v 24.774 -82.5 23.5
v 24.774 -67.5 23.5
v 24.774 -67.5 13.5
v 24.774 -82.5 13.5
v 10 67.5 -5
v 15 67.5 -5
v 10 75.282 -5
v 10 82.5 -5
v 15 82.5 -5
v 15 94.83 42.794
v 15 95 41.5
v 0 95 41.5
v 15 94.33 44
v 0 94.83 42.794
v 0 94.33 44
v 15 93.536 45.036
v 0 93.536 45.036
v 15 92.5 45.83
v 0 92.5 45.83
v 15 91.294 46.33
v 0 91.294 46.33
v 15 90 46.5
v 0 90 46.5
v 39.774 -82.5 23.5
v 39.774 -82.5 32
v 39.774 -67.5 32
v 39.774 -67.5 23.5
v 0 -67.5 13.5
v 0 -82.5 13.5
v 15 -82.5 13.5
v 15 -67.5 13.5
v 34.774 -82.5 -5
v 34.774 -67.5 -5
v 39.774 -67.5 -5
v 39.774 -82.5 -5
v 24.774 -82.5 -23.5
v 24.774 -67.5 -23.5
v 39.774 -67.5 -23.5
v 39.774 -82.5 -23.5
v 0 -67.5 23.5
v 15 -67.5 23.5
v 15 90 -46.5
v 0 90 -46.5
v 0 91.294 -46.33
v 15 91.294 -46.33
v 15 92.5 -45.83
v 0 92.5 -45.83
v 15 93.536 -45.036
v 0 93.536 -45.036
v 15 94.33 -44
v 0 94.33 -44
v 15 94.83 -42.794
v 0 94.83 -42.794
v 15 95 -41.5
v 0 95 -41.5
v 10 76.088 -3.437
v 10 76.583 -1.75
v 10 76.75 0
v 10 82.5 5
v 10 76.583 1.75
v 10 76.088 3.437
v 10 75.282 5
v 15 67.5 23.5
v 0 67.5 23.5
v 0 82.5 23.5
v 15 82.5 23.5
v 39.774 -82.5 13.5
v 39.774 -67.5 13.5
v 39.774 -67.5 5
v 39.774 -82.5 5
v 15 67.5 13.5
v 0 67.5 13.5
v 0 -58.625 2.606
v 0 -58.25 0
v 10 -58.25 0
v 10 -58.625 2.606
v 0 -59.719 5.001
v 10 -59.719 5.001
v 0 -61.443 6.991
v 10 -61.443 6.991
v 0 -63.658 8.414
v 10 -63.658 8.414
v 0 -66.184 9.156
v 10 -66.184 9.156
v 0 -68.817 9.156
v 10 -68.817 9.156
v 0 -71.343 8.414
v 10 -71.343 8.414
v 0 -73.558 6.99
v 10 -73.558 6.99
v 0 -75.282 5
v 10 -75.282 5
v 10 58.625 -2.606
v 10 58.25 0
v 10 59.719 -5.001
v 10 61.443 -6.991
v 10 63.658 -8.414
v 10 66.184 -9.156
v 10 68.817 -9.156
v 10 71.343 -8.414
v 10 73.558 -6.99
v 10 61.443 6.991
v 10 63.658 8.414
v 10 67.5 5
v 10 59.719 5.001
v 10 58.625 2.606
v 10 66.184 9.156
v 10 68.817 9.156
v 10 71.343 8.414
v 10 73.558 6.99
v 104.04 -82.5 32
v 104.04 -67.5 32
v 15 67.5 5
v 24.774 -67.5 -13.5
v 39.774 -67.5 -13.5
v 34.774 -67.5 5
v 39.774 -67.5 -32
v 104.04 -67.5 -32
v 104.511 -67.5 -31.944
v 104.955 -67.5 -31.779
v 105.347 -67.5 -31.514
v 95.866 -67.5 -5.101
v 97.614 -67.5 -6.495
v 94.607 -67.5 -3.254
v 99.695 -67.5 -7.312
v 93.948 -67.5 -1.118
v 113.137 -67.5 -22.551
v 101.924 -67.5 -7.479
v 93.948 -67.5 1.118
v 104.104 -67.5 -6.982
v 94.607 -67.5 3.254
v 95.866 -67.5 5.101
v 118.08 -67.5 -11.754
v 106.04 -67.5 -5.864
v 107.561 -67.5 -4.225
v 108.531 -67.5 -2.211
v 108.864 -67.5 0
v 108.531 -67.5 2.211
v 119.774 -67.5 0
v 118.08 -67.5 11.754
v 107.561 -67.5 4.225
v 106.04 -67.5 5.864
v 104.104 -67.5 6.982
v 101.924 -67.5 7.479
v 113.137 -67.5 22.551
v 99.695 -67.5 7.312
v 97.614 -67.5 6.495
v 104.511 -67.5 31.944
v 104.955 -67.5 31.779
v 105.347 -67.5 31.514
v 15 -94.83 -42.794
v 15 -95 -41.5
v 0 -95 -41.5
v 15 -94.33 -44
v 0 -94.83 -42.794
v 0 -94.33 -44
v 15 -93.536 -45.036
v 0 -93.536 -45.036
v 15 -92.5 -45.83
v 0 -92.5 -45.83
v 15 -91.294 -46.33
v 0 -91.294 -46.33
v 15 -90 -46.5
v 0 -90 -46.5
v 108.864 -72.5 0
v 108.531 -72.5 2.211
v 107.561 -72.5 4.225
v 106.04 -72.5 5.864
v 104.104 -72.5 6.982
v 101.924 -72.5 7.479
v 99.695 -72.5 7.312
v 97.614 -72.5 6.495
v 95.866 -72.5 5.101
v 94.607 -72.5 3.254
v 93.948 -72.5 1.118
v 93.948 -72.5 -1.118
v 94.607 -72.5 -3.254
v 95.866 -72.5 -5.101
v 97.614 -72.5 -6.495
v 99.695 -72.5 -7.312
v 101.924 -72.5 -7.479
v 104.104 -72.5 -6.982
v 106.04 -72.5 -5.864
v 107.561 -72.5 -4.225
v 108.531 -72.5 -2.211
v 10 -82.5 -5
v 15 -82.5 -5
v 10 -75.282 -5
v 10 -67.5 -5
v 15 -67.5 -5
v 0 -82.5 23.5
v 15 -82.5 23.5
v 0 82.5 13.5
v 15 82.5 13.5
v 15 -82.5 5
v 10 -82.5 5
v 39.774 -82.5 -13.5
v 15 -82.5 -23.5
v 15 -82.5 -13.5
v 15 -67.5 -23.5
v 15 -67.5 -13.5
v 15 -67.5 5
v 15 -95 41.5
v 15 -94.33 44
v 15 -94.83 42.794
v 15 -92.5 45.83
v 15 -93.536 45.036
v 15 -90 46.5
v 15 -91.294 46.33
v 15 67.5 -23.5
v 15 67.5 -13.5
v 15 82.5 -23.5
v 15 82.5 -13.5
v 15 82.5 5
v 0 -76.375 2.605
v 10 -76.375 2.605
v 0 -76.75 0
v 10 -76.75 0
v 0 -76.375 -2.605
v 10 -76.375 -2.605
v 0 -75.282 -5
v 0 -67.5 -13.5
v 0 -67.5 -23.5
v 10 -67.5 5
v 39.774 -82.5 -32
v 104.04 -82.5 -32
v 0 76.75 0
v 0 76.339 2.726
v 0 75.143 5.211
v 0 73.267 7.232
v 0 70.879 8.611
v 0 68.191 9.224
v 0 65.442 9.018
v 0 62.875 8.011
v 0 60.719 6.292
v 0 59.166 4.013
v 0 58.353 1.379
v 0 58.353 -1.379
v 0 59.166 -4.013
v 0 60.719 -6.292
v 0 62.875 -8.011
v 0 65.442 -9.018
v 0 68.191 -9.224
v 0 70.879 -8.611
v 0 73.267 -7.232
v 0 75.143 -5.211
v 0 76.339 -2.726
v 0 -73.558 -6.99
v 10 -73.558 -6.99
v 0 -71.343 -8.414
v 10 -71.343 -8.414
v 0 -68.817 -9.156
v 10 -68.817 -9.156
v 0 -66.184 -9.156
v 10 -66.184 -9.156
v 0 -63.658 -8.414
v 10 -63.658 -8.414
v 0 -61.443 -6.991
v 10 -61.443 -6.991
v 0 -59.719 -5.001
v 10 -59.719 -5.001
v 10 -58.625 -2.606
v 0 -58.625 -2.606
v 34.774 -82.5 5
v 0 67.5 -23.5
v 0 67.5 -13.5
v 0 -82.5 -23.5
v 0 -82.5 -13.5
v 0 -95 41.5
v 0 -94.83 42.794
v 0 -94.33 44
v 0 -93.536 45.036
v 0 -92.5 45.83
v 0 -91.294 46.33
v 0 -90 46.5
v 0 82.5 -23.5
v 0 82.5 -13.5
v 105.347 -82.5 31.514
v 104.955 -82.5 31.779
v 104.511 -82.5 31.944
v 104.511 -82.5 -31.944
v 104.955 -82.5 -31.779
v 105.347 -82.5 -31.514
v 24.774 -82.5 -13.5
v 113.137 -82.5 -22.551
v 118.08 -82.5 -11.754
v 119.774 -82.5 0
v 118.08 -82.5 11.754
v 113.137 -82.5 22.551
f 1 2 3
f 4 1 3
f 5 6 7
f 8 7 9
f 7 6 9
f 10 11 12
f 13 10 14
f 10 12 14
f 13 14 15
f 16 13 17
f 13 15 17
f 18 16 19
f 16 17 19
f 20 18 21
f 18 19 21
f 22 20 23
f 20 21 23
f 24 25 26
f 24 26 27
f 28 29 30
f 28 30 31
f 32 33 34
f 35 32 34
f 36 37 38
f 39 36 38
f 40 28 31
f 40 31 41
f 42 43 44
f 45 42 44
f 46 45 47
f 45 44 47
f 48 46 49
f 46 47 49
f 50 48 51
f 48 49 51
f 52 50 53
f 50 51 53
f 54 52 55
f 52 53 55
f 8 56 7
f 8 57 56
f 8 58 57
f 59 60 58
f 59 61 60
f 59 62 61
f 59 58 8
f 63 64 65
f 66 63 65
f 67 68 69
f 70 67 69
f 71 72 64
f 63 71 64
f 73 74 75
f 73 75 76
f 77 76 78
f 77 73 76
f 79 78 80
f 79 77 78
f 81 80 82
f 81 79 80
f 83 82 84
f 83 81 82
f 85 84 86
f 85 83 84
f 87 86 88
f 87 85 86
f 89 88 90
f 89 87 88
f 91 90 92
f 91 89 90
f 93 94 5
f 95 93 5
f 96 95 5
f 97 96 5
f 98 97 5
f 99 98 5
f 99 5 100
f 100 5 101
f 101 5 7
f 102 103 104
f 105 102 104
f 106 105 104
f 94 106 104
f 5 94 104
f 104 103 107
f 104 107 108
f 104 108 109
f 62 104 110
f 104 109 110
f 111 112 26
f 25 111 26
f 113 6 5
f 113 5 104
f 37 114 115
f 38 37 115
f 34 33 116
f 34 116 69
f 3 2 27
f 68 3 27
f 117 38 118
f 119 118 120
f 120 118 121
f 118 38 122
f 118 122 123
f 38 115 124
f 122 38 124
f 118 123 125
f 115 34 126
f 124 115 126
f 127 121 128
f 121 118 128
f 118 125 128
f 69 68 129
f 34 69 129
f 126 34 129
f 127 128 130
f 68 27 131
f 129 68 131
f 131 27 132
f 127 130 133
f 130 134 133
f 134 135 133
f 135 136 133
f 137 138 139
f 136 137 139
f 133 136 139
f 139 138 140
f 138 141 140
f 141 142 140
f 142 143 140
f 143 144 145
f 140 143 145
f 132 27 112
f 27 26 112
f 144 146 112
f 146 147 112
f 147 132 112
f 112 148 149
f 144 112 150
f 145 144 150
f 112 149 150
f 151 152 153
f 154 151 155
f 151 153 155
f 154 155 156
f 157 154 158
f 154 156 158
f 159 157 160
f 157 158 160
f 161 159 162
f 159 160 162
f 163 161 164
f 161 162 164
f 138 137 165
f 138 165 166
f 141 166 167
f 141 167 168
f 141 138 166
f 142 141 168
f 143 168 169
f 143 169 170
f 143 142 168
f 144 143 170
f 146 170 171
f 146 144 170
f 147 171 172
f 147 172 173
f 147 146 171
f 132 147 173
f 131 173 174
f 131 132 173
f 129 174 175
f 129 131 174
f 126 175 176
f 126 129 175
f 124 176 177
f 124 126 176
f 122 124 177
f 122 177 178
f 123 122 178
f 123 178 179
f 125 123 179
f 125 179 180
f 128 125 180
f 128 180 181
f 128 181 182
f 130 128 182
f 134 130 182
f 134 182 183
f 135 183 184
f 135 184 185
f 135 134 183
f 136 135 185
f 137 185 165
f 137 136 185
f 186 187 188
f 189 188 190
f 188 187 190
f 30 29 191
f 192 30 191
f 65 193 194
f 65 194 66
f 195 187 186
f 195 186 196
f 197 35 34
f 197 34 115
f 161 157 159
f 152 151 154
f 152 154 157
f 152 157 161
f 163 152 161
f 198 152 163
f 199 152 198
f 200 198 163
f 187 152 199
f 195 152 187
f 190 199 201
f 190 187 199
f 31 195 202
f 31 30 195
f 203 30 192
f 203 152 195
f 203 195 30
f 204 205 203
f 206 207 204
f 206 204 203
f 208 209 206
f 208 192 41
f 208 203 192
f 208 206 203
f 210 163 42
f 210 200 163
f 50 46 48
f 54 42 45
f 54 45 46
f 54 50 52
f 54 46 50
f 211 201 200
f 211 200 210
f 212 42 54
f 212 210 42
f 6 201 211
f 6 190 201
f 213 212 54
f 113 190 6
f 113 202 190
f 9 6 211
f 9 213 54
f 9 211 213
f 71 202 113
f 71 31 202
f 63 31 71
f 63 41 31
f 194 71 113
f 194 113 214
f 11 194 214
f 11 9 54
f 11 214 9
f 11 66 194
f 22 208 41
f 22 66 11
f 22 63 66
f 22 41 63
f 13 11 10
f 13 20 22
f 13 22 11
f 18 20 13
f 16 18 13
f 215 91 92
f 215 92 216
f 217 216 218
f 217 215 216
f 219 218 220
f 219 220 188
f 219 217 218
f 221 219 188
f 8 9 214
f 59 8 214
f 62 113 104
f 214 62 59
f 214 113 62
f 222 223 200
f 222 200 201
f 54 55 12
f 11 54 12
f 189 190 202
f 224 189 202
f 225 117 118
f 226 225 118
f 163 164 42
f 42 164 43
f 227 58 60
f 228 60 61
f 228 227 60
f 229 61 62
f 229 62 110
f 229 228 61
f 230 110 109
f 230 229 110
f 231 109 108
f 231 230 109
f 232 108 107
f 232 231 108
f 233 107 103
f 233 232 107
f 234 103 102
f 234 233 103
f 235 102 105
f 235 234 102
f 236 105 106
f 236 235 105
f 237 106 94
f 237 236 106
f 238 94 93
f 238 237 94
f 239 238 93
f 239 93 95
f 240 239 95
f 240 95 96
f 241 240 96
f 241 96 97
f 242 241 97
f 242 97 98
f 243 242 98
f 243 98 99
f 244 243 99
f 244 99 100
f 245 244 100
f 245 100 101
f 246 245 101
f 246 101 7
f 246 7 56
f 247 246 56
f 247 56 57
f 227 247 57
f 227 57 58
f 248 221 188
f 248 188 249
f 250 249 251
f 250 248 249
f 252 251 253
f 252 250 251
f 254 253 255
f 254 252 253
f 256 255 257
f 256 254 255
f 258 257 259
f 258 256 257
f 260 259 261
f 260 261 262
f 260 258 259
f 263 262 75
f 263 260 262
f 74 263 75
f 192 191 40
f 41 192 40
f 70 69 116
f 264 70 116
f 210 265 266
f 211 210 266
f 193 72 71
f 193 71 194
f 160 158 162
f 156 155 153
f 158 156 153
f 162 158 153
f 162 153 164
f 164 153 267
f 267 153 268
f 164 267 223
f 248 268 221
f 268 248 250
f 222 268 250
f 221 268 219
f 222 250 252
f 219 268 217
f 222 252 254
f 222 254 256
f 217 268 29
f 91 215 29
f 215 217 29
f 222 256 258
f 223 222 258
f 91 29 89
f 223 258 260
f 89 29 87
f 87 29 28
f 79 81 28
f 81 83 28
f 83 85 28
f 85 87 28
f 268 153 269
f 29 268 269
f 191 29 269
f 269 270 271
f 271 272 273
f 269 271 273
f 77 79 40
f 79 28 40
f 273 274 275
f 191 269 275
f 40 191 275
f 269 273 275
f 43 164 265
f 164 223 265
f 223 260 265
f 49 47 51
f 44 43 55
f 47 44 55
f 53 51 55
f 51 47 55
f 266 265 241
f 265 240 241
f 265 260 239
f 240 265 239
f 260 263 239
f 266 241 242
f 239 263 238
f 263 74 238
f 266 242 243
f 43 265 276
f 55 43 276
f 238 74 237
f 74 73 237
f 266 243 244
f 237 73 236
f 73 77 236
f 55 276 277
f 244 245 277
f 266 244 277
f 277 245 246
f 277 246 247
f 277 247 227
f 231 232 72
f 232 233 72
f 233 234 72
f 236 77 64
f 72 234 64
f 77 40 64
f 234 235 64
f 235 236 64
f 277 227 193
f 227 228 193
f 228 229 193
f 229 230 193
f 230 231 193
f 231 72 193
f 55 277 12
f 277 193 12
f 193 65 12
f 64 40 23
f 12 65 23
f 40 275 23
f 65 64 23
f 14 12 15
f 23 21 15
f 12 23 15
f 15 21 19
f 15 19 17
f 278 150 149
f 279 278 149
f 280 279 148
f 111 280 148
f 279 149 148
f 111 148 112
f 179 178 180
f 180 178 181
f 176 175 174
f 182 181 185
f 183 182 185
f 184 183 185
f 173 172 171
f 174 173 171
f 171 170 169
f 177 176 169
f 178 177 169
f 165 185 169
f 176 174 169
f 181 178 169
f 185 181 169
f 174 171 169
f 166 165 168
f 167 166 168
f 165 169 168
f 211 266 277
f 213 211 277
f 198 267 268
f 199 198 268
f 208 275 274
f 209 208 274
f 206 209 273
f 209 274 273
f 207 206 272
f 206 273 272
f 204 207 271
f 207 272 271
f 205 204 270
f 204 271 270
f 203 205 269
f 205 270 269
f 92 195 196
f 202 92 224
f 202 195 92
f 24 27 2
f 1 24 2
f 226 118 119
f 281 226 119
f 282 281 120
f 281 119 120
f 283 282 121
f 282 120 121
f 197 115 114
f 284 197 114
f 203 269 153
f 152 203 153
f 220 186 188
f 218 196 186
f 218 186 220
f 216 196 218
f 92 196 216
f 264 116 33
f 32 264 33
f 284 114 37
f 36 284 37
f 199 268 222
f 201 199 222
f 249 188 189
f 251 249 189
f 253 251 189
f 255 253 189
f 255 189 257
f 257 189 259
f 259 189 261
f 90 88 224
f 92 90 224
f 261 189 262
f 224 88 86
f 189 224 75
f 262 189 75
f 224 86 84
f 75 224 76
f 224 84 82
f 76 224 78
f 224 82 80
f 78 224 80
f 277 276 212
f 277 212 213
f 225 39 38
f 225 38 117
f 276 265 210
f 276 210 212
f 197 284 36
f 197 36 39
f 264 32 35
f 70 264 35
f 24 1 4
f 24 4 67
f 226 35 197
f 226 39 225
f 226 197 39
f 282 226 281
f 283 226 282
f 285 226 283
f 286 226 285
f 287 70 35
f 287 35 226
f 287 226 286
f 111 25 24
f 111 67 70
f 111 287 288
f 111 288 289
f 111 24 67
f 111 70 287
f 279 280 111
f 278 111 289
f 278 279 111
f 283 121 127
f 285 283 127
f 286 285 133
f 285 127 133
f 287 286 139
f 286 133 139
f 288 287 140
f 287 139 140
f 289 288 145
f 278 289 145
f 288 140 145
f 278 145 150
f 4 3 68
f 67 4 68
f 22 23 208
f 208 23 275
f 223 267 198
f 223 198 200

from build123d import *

# Parameters (mm, degrees)
F0_W     = 15
F0_H     = 10
F0_R     = 9.25
F1_DEPTH = 15
F3_W     = 15
F3_H     = 10
F3_W_2   = 10
F3_H_2   = 15
F3_R     = 7.5
F4_DEPTH = 15
F5_DEPTH = 5
F6_DEPTH = 10
F7_W     = 15
F7_H     = 10
F8_DEPTH = 5


with BuildPart() as f1:
    # F0 (on Right) → F1 (new body)
    with BuildSketch(Plane.YZ):
        with BuildLine():
            Line((-90, -46.5), (90, -46.5))
            ThreePointArc((90, -46.5), (93.5355339059, -45.0355339059), (95, -41.5))
            Line((95, -41.5), (95, 41.5))
            ThreePointArc((95, 41.5), (93.5355339059, 45.0355339059), (90, 46.5))
            Line((90, 46.5), (-90, 46.5))
            ThreePointArc((-90, 46.5), (-93.5355339059, 45.0355339059), (-95, 41.5))
            Line((-95, 41.5), (-95, -41.5))
            ThreePointArc((-95, -41.5), (-93.5355339059, -45.0355339059), (-90, -46.5))
        make_face()
        with Locations((-75, -18.5)):
            Rectangle(F0_W, F0_H, mode=Mode.SUBTRACT)
        with Locations((75, -18.5)):
            Rectangle(F0_W, F0_H, mode=Mode.SUBTRACT)
        with BuildLine():
            ThreePointArc((-75.2821912081, 5), (-64.8945027994, 8.8754653026), (-58.25, 0))
            ThreePointArc((-58.25, 0), (-64.8945027994, -8.8754653026), (-75.2821912081, -5))
            Line((-75.2821912081, -5), (-82.5, -5))
            Line((-82.5, -5), (-82.5, 5))
            Line((-82.5, 5), (-75.2821912081, 5))
        make_face(mode=Mode.SUBTRACT)
        with Locations((-75, 18.5)):
            Rectangle(F0_W, F0_H, mode=Mode.SUBTRACT)
        with Locations((67.5, 0)):
            Circle(F0_R, mode=Mode.SUBTRACT)
        with Locations((75, 18.5)):
            Rectangle(F0_W, F0_H, mode=Mode.SUBTRACT)
        with BuildLine():
            Line((-67.5, 5), (-75.2821912081, 5))
            ThreePointArc((-75.2821912081, 5), (-76.75, 0), (-75.2821912081, -5))
            Line((-75.2821912081, -5), (-67.5, -5))
            Line((-67.5, -5), (-67.5, 5))
        make_face()
        with BuildLine():
            ThreePointArc((-75.2821912081, -5), (-64.8945027994, -8.8754653026), (-58.25, 0))
            ThreePointArc((-58.25, 0), (-64.8945027994, 8.8754653026), (-75.2821912081, 5))
            Line((-75.2821912081, 5), (-67.5, 5))
            Line((-67.5, 5), (-67.5, -5))
            Line((-67.5, -5), (-75.2821912081, -5))
        make_face()
        with Locations((67.5, 0)):
            Circle(F0_R)
        with BuildLine():
            ThreePointArc((-75.2821912081, -5), (-76.75, 0), (-75.2821912081, 5))
            Line((-75.2821912081, 5), (-82.5, 5))
            Line((-82.5, 5), (-82.5, -5))
            Line((-82.5, -5), (-75.2821912081, -5))
        make_face()
    extrude(amount=F1_DEPTH)

    # F0 (on Right) → F6 (cut)
    with BuildSketch(Plane.YZ):
        with Locations((67.5, 0)):
            Circle(F0_R)
        with BuildLine():
            Line((-67.5, 5), (-75.2821912081, 5))
            ThreePointArc((-75.2821912081, 5), (-76.75, 0), (-75.2821912081, -5))
            Line((-75.2821912081, -5), (-67.5, -5))
            Line((-67.5, -5), (-67.5, 5))
        make_face()
        with BuildLine():
            ThreePointArc((-75.2821912081, -5), (-64.8945027994, -8.8754653026), (-58.25, 0))
            ThreePointArc((-58.25, 0), (-64.8945027994, 8.8754653026), (-75.2821912081, 5))
            Line((-75.2821912081, 5), (-67.5, 5))
            Line((-67.5, 5), (-67.5, -5))
            Line((-67.5, -5), (-75.2821912081, -5))
        make_face()
    extrude(amount=F6_DEPTH, mode=Mode.SUBTRACT)

    # F7 (on face) → F8 (cut)
    with BuildSketch(Plane.YZ.offset(15)):
        with Locations((-75, 0)):
            Rectangle(F7_W, F7_H)
        with Locations((75, 0)):
            Rectangle(F7_W, F7_H)
    extrude(amount=-F8_DEPTH, mode=Mode.SUBTRACT)


with BuildPart() as f4:
    # F3 (on offset) → F4 (new body)
    with BuildSketch(Plane.XZ.offset(67.5)):
        with BuildLine():
            ThreePointArc((105.3473567366, 31.5138772077), (104.7376098057, 31.8745338641), (104.04038474, 32))
            Line((104.04038474, 32), (39.7738896741, 32))
            Line((39.7738896741, 32), (39.7738896741, 23.5))
            Line((39.7738896741, 23.5), (24.7738896741, 23.5))
            Line((24.7738896741, 23.5), (24.7738896741, 13.5))
            Line((24.7738896741, 13.5), (39.7738896741, 13.5))
            Line((39.7738896741, 13.5), (39.7738896741, 5))
            Line((39.7738896741, 5), (34.7738896741, 5))
            Line((34.7738896741, 5), (34.7738896741, -5))
            Line((34.7738896741, -5), (39.7738896741, -5))
            Line((39.7738896741, -5), (39.7738896741, -13.5))
            Line((39.7738896741, -13.5), (24.7738896741, -13.5))
            Line((24.7738896741, -13.5), (24.7738896741, -23.5))
            Line((24.7738896741, -23.5), (39.7738896741, -23.5))
            Line((39.7738896741, -23.5), (39.7738896741, -32))
            Line((39.7738896741, -32), (104.04038474, -32))
            ThreePointArc((104.04038474, -32), (104.7376098057, -31.8745338641), (105.3473567366, -31.5138772077))
            ThreePointArc((105.3473567366, -31.5138772077), (119.7738896741, 0), (105.3473567366, 31.5138772077))
        make_face()
        with Locations((93.8638073206, -18.5)):
            Rectangle(F3_W, F3_H, mode=Mode.SUBTRACT)
        with Locations((58.1405563407, 0)):
            Rectangle(F3_W_2, F3_H_2, mode=Mode.SUBTRACT)
        with Locations((101.3638073206, 0)):
            Circle(F3_R, mode=Mode.SUBTRACT)
        with Locations((93.8638073206, 18.5)):
            Rectangle(F3_W, F3_H, mode=Mode.SUBTRACT)
        with Locations((101.3638073206, 0)):
            Circle(F3_R)
        with Locations((93.8638073206, 18.5)):
            Rectangle(F3_W, F3_H)
        with Locations((93.8638073206, -18.5)):
            Rectangle(F3_W, F3_H)
        with Locations((58.1405563407, 0)):
            Rectangle(F3_W_2, F3_H_2)
    extrude(amount=F4_DEPTH)

    # F3 (on offset) → F5 (cut)
    with BuildSketch(Plane.XZ.offset(67.5)):
        with Locations((101.3638073206, 0)):
            Circle(F3_R)
    extrude(amount=F5_DEPTH, mode=Mode.SUBTRACT)


solid = Compound([f1.part, f4.part])
